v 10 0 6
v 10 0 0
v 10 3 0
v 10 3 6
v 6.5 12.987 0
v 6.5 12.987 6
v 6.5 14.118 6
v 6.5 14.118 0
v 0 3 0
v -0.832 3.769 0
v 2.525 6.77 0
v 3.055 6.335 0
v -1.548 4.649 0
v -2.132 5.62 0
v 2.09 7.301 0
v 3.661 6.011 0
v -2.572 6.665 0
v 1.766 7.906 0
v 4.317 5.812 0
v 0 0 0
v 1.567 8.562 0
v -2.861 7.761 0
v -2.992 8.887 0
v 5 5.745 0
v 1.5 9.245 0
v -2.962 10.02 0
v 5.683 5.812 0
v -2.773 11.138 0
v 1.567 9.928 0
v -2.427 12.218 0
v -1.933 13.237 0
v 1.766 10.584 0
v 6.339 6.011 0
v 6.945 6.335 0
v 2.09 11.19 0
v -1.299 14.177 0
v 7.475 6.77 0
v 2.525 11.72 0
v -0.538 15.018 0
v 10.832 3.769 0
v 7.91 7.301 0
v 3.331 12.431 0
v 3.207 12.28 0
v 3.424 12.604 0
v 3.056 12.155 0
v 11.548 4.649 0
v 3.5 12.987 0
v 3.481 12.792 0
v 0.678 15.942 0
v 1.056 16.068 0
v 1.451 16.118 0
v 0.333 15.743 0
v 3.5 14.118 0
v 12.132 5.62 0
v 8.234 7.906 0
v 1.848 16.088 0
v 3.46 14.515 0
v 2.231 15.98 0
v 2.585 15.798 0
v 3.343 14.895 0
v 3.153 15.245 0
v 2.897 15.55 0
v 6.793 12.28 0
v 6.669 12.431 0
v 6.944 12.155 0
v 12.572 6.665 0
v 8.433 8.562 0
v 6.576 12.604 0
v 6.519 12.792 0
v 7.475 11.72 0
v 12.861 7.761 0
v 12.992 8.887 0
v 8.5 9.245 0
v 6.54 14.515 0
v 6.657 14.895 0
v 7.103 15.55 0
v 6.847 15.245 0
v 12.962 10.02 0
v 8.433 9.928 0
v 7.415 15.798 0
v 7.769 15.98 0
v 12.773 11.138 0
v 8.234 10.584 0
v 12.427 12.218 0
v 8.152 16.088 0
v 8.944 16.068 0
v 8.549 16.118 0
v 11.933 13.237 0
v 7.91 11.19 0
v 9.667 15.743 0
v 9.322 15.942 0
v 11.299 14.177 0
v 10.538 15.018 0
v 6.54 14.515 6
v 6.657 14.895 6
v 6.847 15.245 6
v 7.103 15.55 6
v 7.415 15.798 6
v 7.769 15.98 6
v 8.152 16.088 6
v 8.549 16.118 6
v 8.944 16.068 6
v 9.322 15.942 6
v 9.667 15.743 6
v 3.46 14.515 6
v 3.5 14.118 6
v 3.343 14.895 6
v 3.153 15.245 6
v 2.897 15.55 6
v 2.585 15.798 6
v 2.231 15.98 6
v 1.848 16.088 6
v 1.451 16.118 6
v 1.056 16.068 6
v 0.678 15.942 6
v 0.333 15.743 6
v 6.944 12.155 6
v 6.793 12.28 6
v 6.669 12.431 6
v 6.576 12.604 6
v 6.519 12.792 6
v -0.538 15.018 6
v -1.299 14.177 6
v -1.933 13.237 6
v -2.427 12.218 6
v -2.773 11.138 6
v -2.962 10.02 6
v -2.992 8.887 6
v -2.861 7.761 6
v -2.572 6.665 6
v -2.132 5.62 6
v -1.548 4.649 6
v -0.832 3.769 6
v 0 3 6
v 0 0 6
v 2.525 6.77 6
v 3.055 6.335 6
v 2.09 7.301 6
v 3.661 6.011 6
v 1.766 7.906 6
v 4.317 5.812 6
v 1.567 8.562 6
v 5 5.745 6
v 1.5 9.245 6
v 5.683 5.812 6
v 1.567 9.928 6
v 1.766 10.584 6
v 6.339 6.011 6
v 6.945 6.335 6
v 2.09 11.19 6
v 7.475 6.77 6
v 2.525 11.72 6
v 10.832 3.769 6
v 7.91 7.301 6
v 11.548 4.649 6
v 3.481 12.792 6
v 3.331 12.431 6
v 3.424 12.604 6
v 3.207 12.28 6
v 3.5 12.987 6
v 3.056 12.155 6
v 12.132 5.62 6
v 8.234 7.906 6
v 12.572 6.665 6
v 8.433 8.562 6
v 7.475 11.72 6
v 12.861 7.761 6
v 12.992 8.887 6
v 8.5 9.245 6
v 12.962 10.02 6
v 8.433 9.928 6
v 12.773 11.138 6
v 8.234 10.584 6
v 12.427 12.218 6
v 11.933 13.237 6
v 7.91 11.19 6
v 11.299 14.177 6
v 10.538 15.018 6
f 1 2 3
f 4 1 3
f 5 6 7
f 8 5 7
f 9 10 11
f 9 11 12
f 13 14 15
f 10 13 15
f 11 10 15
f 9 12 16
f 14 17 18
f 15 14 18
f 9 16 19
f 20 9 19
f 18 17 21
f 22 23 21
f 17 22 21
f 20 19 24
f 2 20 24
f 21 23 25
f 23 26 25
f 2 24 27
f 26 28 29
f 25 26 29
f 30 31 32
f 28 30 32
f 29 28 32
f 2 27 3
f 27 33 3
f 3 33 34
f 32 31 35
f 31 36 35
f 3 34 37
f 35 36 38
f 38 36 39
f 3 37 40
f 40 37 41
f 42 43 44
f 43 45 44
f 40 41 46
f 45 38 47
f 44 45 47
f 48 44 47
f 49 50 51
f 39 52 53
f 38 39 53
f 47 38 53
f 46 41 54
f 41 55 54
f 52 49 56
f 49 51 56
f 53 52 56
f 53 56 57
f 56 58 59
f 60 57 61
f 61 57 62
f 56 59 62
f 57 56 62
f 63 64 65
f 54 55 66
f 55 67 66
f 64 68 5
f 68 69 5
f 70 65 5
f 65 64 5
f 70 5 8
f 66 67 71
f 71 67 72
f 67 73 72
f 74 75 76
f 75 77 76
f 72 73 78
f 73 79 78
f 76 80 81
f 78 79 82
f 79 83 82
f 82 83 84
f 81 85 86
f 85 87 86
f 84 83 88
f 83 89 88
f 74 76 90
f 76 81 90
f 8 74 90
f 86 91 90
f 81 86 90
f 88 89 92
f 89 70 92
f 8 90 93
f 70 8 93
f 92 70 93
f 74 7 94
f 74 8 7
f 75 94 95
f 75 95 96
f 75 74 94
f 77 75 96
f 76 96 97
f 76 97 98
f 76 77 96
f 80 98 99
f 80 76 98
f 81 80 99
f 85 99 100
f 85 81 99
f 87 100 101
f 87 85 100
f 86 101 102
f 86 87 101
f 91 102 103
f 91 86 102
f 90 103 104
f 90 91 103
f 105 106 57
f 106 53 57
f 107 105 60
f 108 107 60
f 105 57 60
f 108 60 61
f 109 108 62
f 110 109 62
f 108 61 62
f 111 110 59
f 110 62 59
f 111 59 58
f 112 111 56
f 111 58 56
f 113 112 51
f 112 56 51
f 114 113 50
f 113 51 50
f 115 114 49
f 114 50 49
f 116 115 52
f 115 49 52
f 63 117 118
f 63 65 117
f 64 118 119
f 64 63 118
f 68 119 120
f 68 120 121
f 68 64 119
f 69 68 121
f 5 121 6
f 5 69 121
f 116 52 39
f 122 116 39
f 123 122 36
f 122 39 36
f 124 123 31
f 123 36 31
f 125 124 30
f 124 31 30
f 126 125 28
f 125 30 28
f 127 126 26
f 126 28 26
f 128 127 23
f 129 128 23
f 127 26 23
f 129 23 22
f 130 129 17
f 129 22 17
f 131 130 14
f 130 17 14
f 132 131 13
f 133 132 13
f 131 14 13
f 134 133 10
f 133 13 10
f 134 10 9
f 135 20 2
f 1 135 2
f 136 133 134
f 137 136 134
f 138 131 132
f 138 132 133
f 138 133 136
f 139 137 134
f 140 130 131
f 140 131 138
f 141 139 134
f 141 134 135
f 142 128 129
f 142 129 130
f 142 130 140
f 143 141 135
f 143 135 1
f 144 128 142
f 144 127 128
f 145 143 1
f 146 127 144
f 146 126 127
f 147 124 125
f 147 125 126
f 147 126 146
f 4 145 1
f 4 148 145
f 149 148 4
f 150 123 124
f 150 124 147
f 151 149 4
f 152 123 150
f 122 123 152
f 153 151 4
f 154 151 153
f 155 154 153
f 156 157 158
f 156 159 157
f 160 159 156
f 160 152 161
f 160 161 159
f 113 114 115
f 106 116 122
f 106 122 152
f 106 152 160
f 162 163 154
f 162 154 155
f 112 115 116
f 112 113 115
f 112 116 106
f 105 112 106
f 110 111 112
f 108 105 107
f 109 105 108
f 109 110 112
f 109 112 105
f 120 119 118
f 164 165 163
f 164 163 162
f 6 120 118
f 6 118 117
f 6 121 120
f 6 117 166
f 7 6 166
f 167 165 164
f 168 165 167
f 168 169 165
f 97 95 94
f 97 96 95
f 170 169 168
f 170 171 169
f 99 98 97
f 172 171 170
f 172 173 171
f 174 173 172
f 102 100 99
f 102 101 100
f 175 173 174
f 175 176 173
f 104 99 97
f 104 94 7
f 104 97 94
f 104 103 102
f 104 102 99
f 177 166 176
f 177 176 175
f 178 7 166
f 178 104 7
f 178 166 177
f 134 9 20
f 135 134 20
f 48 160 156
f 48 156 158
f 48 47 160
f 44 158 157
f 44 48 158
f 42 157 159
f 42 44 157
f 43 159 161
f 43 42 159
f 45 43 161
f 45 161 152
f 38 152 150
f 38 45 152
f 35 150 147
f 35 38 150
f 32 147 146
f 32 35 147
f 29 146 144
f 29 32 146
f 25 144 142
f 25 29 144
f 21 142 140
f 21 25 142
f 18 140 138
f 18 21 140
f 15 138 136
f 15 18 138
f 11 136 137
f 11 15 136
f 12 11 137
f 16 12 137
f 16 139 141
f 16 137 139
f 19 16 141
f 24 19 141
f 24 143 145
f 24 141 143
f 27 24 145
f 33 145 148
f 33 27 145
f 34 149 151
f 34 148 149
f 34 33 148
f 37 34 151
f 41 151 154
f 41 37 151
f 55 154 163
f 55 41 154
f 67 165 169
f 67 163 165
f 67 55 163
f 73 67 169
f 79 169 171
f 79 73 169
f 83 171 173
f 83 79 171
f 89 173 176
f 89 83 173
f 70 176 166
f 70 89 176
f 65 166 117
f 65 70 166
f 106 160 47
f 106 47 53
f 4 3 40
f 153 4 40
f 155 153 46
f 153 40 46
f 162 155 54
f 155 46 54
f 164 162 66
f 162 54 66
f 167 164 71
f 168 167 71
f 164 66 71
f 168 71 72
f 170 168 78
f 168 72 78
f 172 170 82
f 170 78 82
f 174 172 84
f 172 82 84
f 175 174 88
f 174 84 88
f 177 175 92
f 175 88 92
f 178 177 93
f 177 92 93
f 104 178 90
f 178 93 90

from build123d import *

# Parameters (mm, degrees)
SKETCH1_R           = 3.5
BOSS_EXTRUDE1_DEPTH = 6
SKETCH2_W           = 3
SKETCH2_H           = 6
CUT_EXTRUDE1_DEPTH  = 23.414057106
FILLET1_R           = 2
FILLET2_R           = 1


with BuildPart() as part:
    # Sketch1 → Boss-Extrude1 (new body)
    with BuildSketch(Plane.XY):
        with BuildLine():
            Line((0, 3), (0, 0))
            Line((0, 0), (10, 0))
            Line((10, 0), (10, 3))
            ThreePointArc((10, 3), (5, 17.244997998), (0, 3))
        make_face()
        with Locations((5, 9.244997998)):
            Circle(SKETCH1_R, mode=Mode.SUBTRACT)
    extrude(amount=BOSS_EXTRUDE1_DEPTH)

    # Sketch2 → Cut-Extrude1 (cut, through all)
    with BuildSketch(Plane.XY.offset(6)):
        with Locations((5, 15)):
            Rectangle(SKETCH2_W, SKETCH2_H)
    extrude(amount=-CUT_EXTRUDE1_DEPTH, mode=Mode.SUBTRACT)

    # Fillet1
    fillet1_edges = [part.edges().sort_by_distance(p)[0] for p in [
        (3.5, 17.103114821, 3),
        (6.5, 17.103114821, 3),
    ]]
    fillet(fillet1_edges, radius=FILLET1_R)

    # Fillet2
    fillet2_edges = [part.edges().sort_by_distance(p)[0] for p in [
        (6.5, 12.407275659, 3),
        (3.5, 12.407275659, 3),
    ]]
    fillet(fillet2_edges, radius=FILLET2_R)


solid = part.part
